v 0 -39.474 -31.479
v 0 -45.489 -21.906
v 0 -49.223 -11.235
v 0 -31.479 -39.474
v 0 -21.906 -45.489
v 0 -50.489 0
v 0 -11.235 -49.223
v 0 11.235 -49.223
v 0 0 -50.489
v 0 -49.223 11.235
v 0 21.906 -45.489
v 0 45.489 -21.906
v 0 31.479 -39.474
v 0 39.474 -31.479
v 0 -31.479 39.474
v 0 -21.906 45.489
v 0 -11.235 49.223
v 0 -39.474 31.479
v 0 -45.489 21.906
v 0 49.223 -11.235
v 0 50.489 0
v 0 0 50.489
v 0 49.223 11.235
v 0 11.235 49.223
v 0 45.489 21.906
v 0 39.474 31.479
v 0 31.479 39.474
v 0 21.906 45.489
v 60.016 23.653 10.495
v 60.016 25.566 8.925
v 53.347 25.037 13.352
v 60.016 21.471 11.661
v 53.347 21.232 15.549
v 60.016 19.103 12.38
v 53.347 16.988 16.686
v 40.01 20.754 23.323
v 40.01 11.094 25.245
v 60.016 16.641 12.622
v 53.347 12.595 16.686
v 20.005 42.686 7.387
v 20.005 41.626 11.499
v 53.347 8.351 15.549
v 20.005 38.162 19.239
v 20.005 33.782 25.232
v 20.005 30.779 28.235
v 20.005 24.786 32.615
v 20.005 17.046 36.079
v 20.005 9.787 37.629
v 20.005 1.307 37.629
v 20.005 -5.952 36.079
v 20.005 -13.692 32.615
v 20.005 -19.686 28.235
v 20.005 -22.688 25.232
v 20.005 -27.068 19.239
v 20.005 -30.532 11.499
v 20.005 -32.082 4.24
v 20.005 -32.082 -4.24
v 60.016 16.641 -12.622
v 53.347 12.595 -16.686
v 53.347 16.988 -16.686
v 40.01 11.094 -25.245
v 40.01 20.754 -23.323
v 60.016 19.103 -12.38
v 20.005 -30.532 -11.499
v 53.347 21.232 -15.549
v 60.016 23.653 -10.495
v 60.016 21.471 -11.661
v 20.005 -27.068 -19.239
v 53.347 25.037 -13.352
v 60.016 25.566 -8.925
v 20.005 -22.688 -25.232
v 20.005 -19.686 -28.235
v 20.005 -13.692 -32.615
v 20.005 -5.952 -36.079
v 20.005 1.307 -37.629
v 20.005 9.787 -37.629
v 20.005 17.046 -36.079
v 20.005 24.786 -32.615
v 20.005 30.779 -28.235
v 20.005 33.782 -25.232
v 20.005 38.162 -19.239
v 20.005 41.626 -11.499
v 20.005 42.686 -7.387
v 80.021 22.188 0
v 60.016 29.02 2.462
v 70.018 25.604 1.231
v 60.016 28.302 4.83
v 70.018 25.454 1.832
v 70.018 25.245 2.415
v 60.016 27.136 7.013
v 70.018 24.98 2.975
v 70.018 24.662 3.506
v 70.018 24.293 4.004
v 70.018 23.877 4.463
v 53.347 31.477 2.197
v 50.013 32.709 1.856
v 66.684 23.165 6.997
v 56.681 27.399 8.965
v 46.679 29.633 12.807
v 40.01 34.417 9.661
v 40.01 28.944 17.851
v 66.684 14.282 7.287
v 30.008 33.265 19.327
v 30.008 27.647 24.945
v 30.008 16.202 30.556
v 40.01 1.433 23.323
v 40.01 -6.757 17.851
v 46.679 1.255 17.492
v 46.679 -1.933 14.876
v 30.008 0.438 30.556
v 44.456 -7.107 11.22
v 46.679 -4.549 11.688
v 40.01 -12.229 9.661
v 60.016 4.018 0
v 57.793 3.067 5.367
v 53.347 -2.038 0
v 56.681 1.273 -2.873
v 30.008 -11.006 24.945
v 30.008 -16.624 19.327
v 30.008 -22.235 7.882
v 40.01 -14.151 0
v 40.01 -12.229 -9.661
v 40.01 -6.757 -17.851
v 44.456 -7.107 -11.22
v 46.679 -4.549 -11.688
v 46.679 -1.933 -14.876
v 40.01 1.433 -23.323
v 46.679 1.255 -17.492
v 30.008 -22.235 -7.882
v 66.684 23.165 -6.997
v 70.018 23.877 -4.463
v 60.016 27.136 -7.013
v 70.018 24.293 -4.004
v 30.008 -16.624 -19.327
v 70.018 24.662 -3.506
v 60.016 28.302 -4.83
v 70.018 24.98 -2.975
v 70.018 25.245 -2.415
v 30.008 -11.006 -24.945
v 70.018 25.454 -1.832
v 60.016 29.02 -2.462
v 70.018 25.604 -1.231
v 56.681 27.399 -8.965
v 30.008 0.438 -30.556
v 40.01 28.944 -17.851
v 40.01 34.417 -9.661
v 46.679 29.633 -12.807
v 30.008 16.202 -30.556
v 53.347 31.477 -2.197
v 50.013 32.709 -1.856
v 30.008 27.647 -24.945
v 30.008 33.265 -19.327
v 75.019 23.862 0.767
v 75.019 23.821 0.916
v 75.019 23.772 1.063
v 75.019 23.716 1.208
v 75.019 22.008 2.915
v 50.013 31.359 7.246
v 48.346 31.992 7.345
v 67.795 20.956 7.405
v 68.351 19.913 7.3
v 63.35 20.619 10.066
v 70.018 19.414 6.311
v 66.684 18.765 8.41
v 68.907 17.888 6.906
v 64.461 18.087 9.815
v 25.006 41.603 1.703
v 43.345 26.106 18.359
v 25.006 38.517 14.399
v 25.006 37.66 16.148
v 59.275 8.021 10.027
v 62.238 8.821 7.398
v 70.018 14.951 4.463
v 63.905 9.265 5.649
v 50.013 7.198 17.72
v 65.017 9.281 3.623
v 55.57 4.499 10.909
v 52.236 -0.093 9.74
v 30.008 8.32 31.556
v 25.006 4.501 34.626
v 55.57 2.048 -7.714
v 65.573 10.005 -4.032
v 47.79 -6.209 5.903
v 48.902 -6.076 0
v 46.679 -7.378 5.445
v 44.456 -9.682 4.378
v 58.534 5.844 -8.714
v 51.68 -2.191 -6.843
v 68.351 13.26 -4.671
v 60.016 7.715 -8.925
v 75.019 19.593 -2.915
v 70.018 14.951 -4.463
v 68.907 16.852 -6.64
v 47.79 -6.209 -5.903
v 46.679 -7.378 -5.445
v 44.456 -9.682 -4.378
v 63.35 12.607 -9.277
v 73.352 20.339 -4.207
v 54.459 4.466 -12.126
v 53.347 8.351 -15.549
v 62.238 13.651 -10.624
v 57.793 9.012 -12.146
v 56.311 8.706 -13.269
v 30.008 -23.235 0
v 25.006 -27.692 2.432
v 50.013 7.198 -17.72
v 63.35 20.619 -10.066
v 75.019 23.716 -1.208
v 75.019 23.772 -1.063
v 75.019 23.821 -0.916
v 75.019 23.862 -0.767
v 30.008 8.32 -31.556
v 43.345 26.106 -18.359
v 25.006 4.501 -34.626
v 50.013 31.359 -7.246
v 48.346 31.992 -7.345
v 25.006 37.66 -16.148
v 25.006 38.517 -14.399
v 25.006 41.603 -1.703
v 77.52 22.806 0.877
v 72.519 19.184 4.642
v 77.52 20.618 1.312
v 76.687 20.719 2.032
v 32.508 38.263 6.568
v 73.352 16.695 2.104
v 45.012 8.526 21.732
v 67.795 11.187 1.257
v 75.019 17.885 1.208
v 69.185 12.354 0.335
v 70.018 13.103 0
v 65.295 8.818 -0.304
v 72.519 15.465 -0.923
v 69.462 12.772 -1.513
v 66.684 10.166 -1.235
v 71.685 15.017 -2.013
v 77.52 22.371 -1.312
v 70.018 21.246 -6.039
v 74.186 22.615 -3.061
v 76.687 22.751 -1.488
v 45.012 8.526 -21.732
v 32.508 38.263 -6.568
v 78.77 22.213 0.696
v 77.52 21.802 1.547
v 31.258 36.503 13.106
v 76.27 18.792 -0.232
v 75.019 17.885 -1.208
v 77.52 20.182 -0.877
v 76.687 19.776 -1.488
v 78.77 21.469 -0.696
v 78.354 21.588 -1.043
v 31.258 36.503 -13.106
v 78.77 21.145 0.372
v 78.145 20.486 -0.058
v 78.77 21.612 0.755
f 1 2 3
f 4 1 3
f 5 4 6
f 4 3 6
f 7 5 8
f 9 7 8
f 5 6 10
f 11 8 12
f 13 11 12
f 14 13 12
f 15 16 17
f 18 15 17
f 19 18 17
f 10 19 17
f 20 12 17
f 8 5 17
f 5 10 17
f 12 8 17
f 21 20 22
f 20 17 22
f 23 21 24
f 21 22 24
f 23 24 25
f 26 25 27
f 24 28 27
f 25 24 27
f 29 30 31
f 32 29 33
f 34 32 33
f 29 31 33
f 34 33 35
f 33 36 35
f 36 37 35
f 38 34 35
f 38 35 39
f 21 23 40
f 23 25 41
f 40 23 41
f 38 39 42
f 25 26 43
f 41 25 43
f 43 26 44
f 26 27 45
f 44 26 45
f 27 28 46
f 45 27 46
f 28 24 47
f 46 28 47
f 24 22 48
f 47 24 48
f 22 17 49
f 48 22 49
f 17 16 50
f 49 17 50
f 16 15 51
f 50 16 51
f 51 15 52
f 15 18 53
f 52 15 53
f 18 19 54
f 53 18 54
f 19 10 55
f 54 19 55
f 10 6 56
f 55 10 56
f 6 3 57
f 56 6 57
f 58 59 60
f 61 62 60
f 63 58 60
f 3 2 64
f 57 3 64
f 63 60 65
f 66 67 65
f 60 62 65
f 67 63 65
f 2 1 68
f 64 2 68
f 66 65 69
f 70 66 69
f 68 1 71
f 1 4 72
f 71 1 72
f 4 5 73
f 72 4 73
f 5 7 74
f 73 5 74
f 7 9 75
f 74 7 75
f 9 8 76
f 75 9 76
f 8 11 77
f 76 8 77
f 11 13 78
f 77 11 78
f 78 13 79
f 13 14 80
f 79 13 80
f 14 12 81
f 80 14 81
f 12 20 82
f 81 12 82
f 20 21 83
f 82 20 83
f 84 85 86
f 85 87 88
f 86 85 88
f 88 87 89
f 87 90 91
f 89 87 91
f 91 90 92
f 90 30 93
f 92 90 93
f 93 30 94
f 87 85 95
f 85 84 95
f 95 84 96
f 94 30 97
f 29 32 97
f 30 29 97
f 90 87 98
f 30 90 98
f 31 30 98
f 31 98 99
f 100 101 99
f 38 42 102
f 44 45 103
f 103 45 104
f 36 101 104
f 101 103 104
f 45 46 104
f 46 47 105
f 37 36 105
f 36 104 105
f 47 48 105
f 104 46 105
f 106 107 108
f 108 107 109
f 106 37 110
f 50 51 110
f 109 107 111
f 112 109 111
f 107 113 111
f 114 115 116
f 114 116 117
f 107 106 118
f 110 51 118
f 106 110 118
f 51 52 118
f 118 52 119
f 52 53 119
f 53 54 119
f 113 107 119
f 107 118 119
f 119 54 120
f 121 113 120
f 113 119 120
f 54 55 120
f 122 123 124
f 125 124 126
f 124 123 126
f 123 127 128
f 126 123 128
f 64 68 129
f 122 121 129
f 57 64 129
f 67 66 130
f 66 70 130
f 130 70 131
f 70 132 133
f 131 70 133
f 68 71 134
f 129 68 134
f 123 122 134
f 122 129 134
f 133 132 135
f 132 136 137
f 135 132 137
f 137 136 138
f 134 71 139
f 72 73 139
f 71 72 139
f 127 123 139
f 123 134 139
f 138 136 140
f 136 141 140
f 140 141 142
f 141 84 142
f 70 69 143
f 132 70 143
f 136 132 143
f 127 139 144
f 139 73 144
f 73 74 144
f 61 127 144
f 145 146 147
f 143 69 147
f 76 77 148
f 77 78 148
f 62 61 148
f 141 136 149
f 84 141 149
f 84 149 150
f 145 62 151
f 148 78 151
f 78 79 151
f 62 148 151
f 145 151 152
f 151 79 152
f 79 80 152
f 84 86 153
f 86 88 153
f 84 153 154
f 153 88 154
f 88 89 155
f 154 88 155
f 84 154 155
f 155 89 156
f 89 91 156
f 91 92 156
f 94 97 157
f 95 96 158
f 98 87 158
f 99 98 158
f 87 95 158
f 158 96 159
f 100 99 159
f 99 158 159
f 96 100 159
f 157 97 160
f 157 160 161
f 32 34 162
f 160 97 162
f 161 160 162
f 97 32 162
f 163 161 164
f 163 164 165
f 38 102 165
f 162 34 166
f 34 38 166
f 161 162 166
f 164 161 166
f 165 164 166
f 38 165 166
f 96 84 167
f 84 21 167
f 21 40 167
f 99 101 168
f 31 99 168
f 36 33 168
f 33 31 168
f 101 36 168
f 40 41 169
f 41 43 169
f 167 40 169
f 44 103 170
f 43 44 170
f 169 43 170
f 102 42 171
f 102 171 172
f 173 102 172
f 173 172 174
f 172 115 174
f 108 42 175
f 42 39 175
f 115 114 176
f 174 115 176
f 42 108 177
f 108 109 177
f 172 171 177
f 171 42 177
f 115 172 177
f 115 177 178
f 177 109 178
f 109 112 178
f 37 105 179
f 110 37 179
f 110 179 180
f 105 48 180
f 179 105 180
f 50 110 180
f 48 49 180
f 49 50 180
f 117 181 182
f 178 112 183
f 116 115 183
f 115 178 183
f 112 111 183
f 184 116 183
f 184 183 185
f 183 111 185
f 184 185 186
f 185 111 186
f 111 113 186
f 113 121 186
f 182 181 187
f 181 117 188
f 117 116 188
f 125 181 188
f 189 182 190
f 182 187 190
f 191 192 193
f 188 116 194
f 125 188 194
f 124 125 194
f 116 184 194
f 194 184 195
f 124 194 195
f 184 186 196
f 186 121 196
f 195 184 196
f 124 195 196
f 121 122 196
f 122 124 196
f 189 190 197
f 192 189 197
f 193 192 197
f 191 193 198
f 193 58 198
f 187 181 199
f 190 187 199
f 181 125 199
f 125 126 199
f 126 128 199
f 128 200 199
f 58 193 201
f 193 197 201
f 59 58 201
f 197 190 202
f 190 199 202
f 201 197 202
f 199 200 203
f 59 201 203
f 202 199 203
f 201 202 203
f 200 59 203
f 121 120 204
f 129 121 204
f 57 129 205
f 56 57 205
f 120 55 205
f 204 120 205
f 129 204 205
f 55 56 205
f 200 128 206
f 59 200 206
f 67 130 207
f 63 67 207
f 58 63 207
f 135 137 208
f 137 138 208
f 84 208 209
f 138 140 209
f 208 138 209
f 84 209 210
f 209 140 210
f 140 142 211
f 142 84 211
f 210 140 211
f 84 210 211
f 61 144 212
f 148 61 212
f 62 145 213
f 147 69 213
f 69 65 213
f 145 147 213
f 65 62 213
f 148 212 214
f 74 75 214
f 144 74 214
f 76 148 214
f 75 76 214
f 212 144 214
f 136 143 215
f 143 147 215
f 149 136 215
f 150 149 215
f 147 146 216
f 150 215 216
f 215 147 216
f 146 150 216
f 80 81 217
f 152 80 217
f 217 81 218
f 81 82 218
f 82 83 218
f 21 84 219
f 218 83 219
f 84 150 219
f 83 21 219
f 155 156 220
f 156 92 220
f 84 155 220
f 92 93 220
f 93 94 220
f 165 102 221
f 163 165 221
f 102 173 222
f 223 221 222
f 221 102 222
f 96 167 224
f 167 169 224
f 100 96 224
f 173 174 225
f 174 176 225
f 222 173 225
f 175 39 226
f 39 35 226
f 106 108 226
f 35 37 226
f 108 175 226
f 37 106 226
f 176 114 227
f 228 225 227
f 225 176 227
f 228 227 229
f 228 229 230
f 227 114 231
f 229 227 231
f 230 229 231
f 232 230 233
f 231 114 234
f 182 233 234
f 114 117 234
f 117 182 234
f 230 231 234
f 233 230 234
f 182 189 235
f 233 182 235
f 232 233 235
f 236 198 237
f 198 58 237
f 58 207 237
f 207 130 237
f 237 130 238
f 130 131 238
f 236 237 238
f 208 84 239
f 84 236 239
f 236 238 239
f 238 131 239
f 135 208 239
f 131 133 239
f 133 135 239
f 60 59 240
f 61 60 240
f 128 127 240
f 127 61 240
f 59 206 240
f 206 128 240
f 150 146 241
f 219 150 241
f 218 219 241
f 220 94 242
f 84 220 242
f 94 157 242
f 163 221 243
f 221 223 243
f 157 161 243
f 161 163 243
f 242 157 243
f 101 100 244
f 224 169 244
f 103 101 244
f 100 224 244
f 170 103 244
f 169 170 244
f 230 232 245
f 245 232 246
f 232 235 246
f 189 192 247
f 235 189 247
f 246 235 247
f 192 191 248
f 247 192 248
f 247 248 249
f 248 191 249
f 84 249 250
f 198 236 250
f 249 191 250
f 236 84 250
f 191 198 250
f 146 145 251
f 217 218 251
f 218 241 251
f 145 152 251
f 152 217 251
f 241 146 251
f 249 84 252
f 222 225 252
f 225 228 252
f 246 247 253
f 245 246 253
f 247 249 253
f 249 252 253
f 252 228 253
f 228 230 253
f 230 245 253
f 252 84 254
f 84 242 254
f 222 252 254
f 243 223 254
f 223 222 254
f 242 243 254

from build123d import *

# Parameters (mm, degrees)
F0_R     = 40.5049898026
F1_DEPTH = 554.8116564751
F3_R     = 50.489167609


with BuildPart() as f1:
    # F0 (on Top) → F1 (new body)
    with BuildSketch(Plane.XY):
        Circle(F0_R)
    extrude(amount=F1_DEPTH)


with BuildPart() as f5:
    # F3 (on Right) → F5 section 0
    with BuildSketch(Plane.YZ, mode=Mode.PRIVATE) as f5_s0:
        Circle(F3_R)
    loft([Vertex(80.0207555294, 22.1875607967, 0), f5_s0.sketch])


solid = f5.part
